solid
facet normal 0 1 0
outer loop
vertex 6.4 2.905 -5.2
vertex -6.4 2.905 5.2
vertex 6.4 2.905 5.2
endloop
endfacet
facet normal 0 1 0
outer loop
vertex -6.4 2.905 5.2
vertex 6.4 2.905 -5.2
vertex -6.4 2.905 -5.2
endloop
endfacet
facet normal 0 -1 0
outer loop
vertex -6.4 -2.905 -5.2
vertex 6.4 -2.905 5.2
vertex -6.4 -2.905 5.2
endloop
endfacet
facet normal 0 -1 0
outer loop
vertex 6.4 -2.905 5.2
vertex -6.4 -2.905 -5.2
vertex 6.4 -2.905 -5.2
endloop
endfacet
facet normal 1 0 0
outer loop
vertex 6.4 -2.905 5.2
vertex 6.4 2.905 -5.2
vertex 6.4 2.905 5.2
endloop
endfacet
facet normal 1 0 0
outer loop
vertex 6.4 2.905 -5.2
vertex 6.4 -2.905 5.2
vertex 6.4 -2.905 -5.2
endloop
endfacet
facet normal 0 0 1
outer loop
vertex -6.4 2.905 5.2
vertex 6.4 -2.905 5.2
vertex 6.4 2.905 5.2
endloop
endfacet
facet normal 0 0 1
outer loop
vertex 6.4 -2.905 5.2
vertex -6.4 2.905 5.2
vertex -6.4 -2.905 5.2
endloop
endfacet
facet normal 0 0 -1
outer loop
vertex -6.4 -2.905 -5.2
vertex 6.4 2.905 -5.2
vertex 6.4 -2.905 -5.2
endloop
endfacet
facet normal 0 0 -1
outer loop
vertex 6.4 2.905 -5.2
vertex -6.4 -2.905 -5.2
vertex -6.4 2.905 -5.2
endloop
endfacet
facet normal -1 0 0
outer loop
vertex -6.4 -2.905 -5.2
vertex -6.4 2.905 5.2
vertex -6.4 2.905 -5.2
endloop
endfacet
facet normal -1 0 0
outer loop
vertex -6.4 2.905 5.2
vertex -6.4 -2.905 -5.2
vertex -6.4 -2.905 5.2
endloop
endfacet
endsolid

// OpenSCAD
// Micro-switch Variant Library — one-cad-lib MEASURED reference geometries
// ===========================================================================
//
// Companion to `micro-switch-ss5gl.scad` (the SS-5GL-class clearance model).
// The maintainer's CAD repo (makers-pet/oomwoo-one-cad) carries four switch
// STEP solids under lib/switches/ — part-CAD imports for JLCPCB assembly
// part numbers (the lib/README.md credits only the OOM- scans / camera /
// ky-003; the C-number files carry no provenance note of their own). It also
// records their MEASURED envelopes and the mounting-hole rows, so a
// bumper/dock pocket can be drafted against a REAL geometry candidate and
// compared with the SS-5GL datasheet class in one look.
//
// BOM rows addressed (per-row part identity stays unverified — MEASURE-ME
// sec 15 rules):
//   "LiDAR tower bumper sensor | 4 | $0.70 | Micro switches | SPDT or similar"
//   "Bumper switches | 2 | $0 | Included in cliff sensors bundle"
//
// PROVENANCE — every number below computed 2026-09-17 directly on the STEP
// solids (fetched this run):
//  - envelope = exact solid bbox (kernel BoundingBox; agrees with the
//    VERTEX_POINT hull to <0.01 mm);
//  - holes = CIRCLE radius + AXIS2_PLACEMENT center/normal, cross-checked
//    against vertex Planes;
//  - C50395969 PRODUCT name verbatim: "SW-TH_3P-L12.8-W5.8-P5.08_D2FC-F-K".
//
// Findings (all [M]):
//   variant      bbox X     Y      Z      extras
//   C50395969    12.80      5.81   10.40  D2FC-F-K family; 3 x dia-1.6 holes
//   C107266      12.70      5.74   10.50  2 x dia-1.5 holes
//   C2906291     14.34      5.70   13.30  taller body, no small holes
//   C405949      12.99      5.80   14.36  PRODUCT ...L12.8-W5.8-H11.3-P5.08
//   Shared: 3-terminal 5.08-pitch interface row (blade rims measured).
//   Holes, lib coords, C50395969: axis +Y, centers z = -3.50,
//   x = -8.33 / -3.25 / +1.83 (5.08 pitch).     C107266: dia-1.5 rims pair
//   (y-delta 0.5 in lib frame) at x = -4.08 / +4.08, z = -4.25 — PLUS rim
//   pairs at x +/-6.08 and +/-1.00 same y/z (re-measured 2026-09-19 on the
//   fetched STEP: six d1.5 rim positions, not two) -> hole frame ambiguous
//   in the lib solid -> caliper, not canonical.
//   Re-verification 2026-09-21 (independent cadquery pass on freshly
//   fetched copies): all four bboxes, the C50395969 hole row, and the
//   C107266 six-rim pattern reproduce exactly. Render QA same day: all
//   modes bbox-exact; `compare` mode rewritten (for-body offset
//   accumulation does not persist across iterations in OpenSCAD — boxes
//   rendered stacked); `translate([x])` 1-arg form replaced (2021.01
//   warning). OOM-E03 scan envelopes (lib/irobot) added as mode `capture`
//   reference blocks — measured 2026-09-21, see MEASURE-ME sec 15 addendum.
//
//   vs SS-5GL-class (19.8 x 6.4 x 10.2, 9.5 hole pitch — micro-switch-ss5gl.scad):
//   this class is ~7 mm SHORTER with 5.08 pitch — a different pocket; the
//   purchased unit decides (MEASURE-ME sec 15 row 20).
//
// NOT claimed here (no source this run): operating force/travel, lever
// positions, actuator style per C-number (JLC pages not fetched) — the
// geometry below is ENVELOPE+HOLES ONLY, in lib orientation (axes as
// published; rotate per your mount).
//
// License CC0.

$fn = 48;

/* [Render mode] */
// one       = selected variant envelope + its holes, at origin
// compare   = all four envelopes in a row, 2 mm apart (pocket what-if)
// ss5gl     = the datasheet SS-5GL envelope block, for side-by-side
// capture   = reference blocks for the one-cad lib/irobot OOM-E03 assembly
//             scans, shown TO SCALE next to the C-part envelopes
show = "one"; // [one, compare, ss5gl, capture]

// OOM-E03 scanned bumper-switch assemblies [M] — solid bboxes measured
// 2026-09-21 by cadquery on the fetched one-cad STEPS (3D scans by
// mikbalarikan per that repo's lib/README.md; assembly level, includes
// bracket/wire mass — NOT bare-switch envelopes):
//   OOM-E03-01-bumper-switch.stp  59.18 x 50.29 x 22.42
//   OOM-E03-02-bumper-switch.stp  22.81 x 68.17 x 43.11
e03_1 = [59.18, 50.29, 22.42];
e03_2 = [22.81, 68.17, 43.11];

sel = 0; // 0=C50395969 1=C107266 2=C2906291 3=C405949   (for show="one")

// exact measured bboxes [M]: [Lx, Wy, Hz]
function env(i) =
    i == 0 ? [12.80, 5.81, 10.40] :
    i == 1 ? [12.70, 5.74, 10.50] :
    i == 2 ? [14.34, 5.70, 13.30] :
             [12.99, 5.80, 14.36];
labels = ["C50395969", "C107266", "C2906291", "C405949"];

// C50395969 hole row [M], relative to the envelope (lib frame body spans
// x -9.65..3.15, holes -8.33..+1.83 => first hole 1.32 from the left face;
// z: lib -3.50 with body -4.30..6.10 => 1.70 above envelope mid-plane):
h50_dx0 = 1.32;   // first hole center from the LEFT x face [M]
h50_zbot = 0.80;  // hole-axis height above the envelope BOTTOM face [M]
                  // (lib: axis z -3.50, envelope z -4.30..6.10)

/* [ss5gl reference block (datasheet values, see the other .scad)] */
ss_l = 19.8; ss_w = 6.4; ss_h = 10.2;

module env_box(i, at) {
    e = env(i);
    translate(at) color("DimGray", 0.8) cube([e[0], e[1], e[2]]);
}

module hole_row_50(bucket_x0, e) {
    // hole markers: x = left face + dx0 + k*5.08, axis along Y, z = bottom + zbot;
    // marker cylinder truncated with intersection so the bbox == envelope
    color("Gold")
    intersection() {
        for (k = [0:2])
            translate([bucket_x0 + h50_dx0 + k * 5.08, 0, h50_zbot])
                rotate([-90, 0, 0])
                    cylinder(h = e[1] + 8, d = 1.6, center = true);
        translate([bucket_x0, 0, 0]) cube([e[0], e[1], e[2]]);
    }
}

module one() {
    e = env(sel);
    translate([-e[0]/2, -e[1]/2, -e[2]/2]) {
        env_box(sel, [0, 0, 0]);
        if (sel == 0)
            hole_row_50(0, e);
    }
}

module compare() {
    // OpenSCAD for-body assignments do NOT persist across iterations
    // (each iteration rebinds from the enclosing scope) — offsets are
    // computed explicitly instead of accumulated in the loop.
    off1 = env(0)[0] + 2;
    off2 = env(0)[0] + env(1)[0] + 4;
    off3 = env(0)[0] + env(1)[0] + env(2)[0] + 6;
    env_box(0, [0, 0, 0]);
    hole_row_50(0, env(0));
    env_box(1, [off1, 0, 0]);
    env_box(2, [off2, 0, 0]);
    env_box(3, [off3, 0, 0]);
}

module ss5() { color("LightSlateGray", 0.5) cube([ss_l, ss_w, ss_h], center = true); }

// OOM-E03 reference blocks + the four C-envelope blocks adjacent (sizes
// expected: 59.18 x 50.29 x 22.42 and 22.81 x 68.17 x 43.11 for the scans)
module capture() {
    color("SteelBlue", 0.9) cube(e03_1, center = true);
    translate([e03_1[0] / 2 + e03_2[0] / 2 + 6, 0, 0])
        color("SkyBlue", 0.9) cube(e03_2, center = true);
    off = e03_1[0] + e03_2[0] + 14;
    for (i = [0:3]) {
        translate([off, (i - 1.5) * 10, 0])
            color("DimGray", 0.6)
            cube([env(i)[0] * 4, env(i)[1], env(i)[2]], center = true); // x4 for visibility
    }
}

if (show == "one") one();
else if (show == "compare") compare();
else if (show == "capture") capture();
else ss5();
